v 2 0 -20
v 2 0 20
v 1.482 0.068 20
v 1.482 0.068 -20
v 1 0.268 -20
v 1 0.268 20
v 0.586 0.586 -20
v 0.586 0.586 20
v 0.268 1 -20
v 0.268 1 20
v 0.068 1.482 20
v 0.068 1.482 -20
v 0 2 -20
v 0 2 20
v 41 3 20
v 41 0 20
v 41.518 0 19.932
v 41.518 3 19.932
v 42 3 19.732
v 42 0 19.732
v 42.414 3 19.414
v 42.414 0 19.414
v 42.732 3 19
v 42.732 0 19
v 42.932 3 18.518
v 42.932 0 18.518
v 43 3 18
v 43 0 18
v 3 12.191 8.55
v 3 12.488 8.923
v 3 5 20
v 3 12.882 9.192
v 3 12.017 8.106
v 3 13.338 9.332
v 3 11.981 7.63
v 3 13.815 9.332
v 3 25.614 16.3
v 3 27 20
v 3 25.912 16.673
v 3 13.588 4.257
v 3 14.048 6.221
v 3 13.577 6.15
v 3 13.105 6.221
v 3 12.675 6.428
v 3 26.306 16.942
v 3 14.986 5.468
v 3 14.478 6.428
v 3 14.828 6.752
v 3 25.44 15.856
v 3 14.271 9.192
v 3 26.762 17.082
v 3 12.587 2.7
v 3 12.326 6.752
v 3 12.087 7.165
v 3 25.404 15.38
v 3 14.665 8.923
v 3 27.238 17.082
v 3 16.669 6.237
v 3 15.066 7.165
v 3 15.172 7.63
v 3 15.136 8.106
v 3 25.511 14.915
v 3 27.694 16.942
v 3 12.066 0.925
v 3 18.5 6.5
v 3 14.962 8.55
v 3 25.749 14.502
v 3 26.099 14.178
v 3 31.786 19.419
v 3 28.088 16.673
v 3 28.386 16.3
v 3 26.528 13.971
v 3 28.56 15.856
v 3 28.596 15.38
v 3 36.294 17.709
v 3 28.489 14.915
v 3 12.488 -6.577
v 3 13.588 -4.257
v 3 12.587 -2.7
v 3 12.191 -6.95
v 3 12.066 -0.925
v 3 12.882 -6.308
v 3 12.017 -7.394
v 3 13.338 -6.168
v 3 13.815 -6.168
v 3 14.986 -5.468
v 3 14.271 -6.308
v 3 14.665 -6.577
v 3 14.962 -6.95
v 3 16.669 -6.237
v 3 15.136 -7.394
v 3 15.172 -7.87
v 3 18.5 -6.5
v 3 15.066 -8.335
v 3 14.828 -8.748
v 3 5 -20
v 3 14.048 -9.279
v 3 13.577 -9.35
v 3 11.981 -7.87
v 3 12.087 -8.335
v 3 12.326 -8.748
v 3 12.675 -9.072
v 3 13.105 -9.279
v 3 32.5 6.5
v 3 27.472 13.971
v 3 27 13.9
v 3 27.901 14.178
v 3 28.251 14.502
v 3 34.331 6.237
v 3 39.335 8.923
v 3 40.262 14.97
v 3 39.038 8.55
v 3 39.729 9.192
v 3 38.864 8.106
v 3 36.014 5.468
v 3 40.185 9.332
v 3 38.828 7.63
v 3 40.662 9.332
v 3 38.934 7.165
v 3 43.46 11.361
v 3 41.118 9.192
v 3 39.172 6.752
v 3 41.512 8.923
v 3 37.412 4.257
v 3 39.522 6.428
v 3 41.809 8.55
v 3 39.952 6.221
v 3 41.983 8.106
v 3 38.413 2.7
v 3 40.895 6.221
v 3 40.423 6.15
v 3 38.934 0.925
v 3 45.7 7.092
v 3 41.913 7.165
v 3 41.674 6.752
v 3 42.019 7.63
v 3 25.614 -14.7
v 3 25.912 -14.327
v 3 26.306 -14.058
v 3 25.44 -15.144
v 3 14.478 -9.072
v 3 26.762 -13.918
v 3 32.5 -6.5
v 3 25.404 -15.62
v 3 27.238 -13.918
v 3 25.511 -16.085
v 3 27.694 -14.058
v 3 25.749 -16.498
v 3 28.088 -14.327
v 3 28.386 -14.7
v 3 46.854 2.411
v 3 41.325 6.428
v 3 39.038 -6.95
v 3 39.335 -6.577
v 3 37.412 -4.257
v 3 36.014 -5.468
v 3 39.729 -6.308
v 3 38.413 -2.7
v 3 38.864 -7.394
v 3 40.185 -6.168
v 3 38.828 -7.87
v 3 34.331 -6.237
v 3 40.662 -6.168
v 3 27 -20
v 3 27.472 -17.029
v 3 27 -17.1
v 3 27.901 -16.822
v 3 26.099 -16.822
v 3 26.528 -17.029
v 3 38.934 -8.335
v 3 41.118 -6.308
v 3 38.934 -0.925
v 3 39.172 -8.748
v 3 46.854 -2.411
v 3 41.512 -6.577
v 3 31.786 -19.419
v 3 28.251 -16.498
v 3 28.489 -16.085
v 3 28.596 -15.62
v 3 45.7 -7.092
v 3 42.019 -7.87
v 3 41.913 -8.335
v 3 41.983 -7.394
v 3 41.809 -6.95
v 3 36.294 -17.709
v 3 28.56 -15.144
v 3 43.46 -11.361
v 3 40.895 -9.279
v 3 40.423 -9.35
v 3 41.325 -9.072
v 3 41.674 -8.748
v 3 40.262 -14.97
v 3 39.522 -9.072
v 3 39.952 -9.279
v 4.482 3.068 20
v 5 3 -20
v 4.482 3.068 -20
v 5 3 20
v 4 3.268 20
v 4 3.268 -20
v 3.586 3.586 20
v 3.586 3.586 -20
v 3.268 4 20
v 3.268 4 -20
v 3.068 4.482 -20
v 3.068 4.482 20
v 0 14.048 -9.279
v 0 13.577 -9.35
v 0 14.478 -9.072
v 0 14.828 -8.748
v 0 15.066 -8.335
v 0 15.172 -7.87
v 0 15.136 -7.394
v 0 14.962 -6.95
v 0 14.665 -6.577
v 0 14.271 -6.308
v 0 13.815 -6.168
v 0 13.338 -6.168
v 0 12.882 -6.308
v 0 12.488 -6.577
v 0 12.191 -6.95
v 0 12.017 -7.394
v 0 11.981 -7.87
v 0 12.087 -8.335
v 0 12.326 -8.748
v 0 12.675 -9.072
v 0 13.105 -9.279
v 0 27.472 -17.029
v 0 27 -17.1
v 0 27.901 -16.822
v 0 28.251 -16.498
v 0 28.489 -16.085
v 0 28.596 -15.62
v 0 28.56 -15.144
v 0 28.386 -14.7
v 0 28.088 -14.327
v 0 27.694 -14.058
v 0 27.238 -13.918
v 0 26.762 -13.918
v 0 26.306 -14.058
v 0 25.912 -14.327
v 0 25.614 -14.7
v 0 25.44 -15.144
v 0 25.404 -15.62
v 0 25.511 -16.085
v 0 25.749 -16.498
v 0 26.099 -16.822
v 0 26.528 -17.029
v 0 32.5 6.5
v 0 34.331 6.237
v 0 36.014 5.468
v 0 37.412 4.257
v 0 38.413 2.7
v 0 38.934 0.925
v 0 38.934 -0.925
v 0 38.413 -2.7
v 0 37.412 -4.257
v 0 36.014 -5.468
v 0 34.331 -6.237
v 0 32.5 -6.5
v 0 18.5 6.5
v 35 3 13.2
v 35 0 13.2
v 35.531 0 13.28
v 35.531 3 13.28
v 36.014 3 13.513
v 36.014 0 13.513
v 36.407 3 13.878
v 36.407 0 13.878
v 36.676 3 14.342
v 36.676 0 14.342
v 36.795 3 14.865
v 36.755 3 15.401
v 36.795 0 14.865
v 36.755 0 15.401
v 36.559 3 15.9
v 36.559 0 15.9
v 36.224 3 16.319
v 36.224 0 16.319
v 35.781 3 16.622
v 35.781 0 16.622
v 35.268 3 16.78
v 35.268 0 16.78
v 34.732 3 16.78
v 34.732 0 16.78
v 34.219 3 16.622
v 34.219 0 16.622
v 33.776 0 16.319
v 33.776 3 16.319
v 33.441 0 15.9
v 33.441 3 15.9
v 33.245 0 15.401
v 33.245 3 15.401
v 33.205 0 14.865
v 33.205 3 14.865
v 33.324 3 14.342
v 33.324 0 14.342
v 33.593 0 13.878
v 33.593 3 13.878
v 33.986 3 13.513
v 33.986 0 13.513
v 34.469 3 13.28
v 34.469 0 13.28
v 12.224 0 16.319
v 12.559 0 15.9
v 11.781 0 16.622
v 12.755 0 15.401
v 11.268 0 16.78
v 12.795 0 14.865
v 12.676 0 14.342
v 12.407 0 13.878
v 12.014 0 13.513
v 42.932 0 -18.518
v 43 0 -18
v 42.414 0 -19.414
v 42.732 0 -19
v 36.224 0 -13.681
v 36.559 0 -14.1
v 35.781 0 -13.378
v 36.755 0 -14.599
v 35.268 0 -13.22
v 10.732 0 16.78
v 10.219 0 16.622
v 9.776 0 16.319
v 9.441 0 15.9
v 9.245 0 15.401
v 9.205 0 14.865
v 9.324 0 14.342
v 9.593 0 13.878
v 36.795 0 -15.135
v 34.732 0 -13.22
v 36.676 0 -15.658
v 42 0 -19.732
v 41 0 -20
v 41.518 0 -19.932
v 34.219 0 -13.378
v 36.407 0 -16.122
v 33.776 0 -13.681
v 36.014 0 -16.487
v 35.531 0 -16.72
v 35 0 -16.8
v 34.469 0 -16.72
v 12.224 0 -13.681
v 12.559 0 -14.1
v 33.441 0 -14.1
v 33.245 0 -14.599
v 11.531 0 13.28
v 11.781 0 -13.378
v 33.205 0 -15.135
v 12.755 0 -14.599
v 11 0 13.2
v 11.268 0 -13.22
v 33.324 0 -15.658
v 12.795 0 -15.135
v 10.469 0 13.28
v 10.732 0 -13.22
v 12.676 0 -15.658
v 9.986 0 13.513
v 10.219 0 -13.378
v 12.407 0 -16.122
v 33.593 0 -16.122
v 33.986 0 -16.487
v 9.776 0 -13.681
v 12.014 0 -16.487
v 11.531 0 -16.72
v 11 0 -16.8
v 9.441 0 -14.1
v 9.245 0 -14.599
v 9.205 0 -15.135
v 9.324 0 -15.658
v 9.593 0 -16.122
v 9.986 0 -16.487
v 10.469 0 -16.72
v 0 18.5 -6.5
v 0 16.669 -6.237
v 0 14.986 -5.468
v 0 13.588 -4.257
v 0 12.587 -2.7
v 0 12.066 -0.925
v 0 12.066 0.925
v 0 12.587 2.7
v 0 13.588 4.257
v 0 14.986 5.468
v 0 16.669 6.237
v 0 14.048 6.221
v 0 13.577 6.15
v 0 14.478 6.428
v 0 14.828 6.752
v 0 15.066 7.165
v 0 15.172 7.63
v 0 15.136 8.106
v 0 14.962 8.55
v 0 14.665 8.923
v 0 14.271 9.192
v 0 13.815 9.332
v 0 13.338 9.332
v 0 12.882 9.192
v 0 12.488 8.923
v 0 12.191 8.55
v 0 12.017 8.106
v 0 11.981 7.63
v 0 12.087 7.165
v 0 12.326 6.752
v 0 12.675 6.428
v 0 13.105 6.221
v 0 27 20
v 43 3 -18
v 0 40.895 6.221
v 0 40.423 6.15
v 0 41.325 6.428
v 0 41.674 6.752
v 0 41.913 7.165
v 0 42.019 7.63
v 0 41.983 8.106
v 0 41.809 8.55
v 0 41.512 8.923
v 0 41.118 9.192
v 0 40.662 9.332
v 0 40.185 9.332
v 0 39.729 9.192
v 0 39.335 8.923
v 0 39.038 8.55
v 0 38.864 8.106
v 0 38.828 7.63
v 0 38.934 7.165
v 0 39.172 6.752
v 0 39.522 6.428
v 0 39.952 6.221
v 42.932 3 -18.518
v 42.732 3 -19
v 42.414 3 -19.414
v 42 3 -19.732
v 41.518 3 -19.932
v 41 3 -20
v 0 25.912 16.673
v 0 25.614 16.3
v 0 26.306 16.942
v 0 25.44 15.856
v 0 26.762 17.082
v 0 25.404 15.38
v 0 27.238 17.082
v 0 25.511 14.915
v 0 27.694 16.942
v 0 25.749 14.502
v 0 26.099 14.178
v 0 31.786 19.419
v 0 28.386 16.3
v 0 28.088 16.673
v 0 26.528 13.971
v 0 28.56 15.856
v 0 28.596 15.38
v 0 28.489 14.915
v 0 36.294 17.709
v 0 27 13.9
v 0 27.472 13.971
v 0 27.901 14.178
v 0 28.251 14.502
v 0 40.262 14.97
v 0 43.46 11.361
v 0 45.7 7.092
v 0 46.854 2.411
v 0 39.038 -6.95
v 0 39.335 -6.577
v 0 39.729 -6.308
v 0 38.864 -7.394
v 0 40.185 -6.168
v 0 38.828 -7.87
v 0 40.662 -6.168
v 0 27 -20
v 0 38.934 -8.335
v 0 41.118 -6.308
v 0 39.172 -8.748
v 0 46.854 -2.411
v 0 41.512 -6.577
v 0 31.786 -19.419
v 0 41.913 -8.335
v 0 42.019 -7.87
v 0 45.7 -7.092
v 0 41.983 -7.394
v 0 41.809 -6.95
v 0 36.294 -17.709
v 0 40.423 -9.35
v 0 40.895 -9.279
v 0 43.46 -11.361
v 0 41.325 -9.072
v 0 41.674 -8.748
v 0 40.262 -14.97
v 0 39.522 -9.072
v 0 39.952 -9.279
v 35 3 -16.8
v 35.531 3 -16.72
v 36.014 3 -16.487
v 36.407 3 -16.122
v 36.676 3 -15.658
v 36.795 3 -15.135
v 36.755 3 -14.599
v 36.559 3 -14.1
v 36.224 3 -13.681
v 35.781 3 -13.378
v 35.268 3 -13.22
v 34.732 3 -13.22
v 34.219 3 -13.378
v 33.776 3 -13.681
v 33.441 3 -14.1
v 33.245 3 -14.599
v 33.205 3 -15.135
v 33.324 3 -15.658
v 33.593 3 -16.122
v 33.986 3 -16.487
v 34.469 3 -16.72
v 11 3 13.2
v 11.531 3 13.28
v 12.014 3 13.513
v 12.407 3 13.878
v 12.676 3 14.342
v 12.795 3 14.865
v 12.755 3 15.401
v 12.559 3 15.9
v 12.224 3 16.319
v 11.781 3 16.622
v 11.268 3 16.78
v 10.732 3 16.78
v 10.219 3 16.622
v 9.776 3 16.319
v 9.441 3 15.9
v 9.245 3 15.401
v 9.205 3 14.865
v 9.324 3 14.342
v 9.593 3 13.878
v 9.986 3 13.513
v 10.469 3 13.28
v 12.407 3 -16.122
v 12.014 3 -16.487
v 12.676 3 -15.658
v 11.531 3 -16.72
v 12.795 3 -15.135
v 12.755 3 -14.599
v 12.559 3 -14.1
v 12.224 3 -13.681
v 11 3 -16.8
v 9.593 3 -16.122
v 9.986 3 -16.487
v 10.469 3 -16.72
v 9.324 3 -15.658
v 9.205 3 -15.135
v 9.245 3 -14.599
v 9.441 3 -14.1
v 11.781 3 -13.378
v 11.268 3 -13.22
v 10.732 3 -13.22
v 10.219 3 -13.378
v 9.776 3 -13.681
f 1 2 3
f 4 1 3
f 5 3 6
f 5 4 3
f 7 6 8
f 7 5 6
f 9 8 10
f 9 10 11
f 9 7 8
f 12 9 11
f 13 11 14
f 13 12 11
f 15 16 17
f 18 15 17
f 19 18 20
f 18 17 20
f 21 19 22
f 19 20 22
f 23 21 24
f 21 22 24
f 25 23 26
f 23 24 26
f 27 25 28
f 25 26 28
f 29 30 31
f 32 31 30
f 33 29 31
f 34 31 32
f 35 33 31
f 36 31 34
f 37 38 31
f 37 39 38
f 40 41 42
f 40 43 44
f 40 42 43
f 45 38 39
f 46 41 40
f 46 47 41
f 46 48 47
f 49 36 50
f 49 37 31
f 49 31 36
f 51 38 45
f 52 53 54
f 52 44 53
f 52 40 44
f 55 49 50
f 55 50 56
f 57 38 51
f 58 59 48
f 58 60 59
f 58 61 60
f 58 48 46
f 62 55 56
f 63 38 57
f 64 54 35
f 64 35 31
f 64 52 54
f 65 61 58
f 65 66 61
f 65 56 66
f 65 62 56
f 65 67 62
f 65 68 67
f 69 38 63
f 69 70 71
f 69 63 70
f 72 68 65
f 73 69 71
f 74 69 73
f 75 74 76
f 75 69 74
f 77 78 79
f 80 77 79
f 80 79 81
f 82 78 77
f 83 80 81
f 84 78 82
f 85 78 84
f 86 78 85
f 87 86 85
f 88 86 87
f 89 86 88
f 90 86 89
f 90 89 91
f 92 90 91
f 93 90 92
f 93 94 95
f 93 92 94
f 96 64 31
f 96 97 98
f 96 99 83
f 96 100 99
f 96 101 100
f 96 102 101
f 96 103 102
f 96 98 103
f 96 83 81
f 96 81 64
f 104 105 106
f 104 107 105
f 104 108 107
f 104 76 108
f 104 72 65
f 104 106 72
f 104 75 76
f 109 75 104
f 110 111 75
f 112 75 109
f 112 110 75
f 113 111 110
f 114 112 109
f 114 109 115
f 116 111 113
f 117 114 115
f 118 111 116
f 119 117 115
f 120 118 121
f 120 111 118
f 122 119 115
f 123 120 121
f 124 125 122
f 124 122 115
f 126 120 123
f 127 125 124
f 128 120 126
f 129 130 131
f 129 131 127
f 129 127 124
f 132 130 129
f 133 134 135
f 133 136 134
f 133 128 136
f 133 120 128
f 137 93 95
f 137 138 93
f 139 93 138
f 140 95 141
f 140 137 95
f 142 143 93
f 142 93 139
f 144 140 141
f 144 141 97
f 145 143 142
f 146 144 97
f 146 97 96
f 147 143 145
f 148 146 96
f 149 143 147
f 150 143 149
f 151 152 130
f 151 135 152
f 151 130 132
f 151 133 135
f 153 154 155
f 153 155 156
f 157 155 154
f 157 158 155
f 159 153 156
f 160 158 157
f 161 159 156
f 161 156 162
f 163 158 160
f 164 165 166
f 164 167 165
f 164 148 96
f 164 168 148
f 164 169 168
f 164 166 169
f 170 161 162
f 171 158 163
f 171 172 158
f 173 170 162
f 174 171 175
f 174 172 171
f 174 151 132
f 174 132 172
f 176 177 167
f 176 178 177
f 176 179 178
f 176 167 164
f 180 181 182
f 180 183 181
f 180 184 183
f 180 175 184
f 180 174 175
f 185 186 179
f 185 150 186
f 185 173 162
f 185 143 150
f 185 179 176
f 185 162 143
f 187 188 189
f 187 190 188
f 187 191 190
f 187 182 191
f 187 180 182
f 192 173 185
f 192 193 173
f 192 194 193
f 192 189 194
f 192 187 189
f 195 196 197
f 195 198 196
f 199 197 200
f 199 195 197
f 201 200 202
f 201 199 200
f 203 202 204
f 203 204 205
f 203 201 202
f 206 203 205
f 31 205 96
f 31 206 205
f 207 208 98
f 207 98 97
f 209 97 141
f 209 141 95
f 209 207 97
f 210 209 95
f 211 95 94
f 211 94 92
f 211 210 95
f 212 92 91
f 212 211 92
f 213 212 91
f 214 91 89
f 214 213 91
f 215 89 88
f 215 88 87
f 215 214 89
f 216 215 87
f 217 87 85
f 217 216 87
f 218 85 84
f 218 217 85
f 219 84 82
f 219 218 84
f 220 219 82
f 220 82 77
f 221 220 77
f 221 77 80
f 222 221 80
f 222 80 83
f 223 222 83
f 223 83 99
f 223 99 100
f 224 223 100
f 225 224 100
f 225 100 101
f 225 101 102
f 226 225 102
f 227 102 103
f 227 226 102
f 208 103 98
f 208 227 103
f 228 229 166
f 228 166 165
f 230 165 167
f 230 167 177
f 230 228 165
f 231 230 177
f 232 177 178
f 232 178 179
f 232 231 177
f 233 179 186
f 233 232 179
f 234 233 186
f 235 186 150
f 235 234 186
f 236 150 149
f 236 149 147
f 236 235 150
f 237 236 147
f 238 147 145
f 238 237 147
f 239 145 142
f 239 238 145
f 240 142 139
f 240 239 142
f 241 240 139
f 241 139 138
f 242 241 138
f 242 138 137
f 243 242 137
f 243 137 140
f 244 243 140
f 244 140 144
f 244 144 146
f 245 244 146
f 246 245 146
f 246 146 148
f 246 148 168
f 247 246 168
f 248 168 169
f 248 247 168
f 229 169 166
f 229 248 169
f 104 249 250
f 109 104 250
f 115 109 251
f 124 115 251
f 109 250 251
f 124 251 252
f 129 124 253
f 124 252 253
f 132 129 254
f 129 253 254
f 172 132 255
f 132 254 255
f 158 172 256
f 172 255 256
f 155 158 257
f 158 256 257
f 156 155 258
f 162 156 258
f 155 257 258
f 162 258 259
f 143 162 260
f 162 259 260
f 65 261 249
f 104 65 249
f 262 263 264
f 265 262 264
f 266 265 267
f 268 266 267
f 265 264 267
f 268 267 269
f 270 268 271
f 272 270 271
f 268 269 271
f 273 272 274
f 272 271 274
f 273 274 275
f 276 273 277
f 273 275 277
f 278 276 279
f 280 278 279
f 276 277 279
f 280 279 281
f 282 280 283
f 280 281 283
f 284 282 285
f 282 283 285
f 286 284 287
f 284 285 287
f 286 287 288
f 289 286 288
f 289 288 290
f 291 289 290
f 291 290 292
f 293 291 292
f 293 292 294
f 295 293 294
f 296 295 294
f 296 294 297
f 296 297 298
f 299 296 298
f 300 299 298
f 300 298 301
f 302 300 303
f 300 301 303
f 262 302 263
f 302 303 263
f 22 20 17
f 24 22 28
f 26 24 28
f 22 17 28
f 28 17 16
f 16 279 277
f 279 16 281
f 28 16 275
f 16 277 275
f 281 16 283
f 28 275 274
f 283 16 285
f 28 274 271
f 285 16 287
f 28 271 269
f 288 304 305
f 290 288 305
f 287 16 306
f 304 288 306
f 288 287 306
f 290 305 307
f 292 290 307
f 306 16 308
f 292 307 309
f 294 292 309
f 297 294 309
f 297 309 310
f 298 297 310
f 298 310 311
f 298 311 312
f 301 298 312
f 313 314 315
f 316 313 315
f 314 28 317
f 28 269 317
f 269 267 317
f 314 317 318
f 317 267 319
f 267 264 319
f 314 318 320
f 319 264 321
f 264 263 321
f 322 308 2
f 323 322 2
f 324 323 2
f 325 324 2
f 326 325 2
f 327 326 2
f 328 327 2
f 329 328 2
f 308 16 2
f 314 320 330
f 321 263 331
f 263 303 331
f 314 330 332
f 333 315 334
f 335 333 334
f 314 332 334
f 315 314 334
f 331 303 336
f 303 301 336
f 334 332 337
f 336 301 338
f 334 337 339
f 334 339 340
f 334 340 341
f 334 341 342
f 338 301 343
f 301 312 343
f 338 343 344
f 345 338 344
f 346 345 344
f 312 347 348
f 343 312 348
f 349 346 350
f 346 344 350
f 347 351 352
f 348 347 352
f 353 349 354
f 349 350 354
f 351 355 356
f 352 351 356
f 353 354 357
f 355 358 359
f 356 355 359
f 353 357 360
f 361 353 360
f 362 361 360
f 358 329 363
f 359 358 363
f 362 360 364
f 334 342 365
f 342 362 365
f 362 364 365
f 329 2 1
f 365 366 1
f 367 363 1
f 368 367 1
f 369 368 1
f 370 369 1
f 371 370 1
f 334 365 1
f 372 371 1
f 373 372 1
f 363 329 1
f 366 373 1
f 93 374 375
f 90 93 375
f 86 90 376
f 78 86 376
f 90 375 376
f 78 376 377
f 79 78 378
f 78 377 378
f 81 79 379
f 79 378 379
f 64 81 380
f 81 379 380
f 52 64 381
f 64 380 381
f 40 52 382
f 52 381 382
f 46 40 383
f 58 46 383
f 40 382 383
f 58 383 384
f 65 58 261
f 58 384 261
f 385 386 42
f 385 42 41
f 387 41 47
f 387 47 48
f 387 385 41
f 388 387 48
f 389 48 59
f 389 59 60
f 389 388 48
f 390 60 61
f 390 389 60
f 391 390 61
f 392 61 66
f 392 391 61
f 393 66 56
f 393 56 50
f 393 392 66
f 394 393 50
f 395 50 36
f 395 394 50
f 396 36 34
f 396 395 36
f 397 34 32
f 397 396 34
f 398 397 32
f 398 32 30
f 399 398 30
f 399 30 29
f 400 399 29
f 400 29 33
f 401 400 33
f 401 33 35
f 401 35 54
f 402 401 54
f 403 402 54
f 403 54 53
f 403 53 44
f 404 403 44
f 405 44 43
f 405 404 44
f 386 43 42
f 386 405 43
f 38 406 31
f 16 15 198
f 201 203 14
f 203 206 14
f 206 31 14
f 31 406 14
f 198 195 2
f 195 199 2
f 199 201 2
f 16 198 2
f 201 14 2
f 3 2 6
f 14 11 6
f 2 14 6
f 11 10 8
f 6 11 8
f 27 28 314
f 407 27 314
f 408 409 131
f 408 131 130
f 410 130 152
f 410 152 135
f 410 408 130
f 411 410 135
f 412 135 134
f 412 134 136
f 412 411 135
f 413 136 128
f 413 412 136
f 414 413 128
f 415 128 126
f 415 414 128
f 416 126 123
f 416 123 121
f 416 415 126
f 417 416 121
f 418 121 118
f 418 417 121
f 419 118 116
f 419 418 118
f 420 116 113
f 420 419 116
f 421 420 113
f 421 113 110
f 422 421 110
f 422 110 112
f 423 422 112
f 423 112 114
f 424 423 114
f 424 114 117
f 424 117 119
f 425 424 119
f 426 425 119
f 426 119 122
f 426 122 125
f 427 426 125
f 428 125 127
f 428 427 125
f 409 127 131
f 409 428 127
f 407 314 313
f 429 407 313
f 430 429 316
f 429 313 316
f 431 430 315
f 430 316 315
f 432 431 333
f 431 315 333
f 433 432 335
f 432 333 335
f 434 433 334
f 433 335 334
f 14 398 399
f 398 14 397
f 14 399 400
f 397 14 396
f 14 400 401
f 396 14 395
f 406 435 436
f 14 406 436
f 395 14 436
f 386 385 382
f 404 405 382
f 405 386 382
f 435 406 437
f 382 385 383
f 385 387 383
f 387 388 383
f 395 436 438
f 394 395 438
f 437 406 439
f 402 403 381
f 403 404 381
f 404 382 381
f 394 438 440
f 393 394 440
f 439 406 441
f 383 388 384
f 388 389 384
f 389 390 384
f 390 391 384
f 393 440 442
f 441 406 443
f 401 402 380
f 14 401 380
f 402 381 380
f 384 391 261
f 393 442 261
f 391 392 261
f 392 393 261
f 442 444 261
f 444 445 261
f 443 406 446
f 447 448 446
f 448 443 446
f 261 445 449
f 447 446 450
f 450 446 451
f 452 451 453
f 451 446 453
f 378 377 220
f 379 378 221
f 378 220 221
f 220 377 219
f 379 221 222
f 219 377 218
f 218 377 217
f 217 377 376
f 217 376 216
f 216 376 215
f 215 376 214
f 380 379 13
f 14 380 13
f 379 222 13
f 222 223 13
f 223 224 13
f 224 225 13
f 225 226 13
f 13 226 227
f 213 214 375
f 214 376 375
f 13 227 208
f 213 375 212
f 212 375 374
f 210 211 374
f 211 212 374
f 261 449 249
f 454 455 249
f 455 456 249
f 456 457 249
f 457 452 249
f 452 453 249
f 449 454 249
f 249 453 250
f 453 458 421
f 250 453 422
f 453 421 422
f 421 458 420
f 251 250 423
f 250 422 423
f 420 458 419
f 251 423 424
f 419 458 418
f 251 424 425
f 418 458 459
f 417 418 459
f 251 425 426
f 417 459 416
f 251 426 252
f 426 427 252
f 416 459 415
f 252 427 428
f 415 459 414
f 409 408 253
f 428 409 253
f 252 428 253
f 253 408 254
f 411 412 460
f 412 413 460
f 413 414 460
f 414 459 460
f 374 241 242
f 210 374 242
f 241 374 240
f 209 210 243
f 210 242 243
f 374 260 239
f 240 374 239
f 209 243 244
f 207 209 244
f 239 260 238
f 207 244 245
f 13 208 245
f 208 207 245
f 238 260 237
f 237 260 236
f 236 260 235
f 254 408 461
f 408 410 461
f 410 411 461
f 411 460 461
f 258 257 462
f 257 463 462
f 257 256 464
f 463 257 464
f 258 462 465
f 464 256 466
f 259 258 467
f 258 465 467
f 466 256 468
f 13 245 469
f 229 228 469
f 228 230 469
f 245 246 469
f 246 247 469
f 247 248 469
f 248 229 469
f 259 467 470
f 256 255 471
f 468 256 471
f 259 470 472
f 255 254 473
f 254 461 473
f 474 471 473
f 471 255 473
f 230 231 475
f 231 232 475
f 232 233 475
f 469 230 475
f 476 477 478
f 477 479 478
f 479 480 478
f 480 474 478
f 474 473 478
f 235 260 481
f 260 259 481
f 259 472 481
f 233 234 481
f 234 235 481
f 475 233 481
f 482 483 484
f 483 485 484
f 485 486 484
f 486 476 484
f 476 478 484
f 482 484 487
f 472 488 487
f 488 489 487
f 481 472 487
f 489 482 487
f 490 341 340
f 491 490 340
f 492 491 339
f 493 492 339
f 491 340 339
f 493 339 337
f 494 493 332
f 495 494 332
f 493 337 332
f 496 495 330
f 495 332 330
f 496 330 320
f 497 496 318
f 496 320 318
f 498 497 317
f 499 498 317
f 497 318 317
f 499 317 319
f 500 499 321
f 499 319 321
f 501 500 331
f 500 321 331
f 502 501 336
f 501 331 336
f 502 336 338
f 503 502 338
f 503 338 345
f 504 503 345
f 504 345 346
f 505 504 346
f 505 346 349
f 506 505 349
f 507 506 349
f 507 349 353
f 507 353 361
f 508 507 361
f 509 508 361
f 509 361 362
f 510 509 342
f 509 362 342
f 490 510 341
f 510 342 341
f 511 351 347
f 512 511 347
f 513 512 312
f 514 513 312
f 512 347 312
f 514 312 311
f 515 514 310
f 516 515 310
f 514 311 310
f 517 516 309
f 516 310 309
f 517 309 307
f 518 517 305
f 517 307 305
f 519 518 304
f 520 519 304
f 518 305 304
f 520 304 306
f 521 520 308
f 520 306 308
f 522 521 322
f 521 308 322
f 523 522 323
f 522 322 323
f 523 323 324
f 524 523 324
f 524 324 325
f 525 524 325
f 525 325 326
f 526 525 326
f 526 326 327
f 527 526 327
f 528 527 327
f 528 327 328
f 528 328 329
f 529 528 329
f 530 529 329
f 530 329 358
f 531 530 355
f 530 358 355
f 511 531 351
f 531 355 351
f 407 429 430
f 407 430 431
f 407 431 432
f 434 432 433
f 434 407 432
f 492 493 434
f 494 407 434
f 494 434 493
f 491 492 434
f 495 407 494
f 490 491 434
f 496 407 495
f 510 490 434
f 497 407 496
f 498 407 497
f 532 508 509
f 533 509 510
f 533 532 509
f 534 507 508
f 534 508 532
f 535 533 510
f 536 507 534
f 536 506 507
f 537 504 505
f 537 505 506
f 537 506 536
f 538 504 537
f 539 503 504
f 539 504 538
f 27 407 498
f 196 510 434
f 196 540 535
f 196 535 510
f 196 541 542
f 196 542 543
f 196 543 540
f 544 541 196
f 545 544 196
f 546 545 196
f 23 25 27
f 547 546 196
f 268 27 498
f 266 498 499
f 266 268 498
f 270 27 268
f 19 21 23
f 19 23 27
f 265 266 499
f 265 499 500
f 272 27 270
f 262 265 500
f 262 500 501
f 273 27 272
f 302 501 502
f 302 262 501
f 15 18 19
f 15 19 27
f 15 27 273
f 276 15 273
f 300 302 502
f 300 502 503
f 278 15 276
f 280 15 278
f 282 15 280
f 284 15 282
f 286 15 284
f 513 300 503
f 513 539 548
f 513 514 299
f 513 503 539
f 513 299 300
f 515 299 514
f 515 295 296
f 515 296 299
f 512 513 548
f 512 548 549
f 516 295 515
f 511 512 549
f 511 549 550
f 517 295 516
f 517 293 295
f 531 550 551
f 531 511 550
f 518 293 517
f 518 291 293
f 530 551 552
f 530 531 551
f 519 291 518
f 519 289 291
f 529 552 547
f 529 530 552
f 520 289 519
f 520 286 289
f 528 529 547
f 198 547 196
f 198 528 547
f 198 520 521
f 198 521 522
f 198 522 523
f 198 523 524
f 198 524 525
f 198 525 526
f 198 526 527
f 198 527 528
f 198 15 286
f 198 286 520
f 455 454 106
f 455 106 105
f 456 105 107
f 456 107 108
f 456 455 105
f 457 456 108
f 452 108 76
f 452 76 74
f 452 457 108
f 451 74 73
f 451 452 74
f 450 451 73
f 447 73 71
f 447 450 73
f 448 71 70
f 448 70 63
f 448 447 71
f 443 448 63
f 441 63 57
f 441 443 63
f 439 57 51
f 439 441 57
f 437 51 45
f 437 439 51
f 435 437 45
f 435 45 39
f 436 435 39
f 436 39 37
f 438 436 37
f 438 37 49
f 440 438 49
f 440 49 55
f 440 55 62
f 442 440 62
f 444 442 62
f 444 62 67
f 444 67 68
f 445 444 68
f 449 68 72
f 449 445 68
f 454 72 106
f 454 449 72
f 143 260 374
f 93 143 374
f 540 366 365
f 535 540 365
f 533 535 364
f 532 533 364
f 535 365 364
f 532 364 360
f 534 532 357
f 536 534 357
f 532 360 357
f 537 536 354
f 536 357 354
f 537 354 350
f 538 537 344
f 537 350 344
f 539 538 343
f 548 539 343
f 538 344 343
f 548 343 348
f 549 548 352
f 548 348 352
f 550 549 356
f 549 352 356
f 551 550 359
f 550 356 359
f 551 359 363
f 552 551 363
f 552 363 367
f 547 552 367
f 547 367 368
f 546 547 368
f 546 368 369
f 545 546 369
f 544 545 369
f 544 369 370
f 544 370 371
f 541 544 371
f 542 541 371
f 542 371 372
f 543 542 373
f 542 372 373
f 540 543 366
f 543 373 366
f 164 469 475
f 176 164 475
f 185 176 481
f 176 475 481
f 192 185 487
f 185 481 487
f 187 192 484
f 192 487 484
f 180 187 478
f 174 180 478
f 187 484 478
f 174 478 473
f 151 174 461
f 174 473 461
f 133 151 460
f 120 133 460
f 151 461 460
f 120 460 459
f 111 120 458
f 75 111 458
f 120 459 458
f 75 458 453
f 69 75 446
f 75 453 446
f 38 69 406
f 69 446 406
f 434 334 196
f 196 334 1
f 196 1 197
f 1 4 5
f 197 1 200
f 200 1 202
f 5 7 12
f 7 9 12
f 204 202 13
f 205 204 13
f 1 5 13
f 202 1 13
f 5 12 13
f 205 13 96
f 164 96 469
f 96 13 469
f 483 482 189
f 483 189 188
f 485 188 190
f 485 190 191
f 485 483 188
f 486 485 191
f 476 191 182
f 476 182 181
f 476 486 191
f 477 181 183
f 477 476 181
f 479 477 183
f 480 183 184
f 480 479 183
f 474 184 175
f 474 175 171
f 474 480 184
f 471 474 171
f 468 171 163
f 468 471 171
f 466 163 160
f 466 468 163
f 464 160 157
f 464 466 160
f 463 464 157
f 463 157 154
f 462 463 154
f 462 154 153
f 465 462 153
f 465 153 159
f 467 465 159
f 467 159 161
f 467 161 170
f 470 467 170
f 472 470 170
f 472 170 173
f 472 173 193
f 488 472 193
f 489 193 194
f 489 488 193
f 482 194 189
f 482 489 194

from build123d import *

# Parameters (mm, degrees)
SKETCH_1_R      = 1.6
EXTRUDE_1_DEPTH = 3
SKETCH_2_R      = 1.8
EXTRUDE_2_DEPTH = 3
FILLET_1_R      = 2


with BuildPart() as part:
    # 草图1 → 凸台-拉伸1 (new body)
    with BuildSketch(Plane(origin=(0, 0, 0), x_dir=(0, 0, -1), z_dir=(1, 0, 0))):
        with BuildLine():
            Line((-20, 0), (20, 0))
            Line((20, 0), (20, 27))
            ThreePointArc((20, 27), (0, 47), (-20, 27))
            Line((-20, 27), (-20, 0))
        make_face()
        with Locations((-7.75, 40.423393759)):
            Circle(SKETCH_1_R, mode=Mode.SUBTRACT)
        with Locations((7.75, 40.423393759)):
            Circle(SKETCH_1_R, mode=Mode.SUBTRACT)
        with Locations((15.5, 27)):
            Circle(SKETCH_1_R, mode=Mode.SUBTRACT)
        with Locations((7.75, 13.576606241)):
            Circle(SKETCH_1_R, mode=Mode.SUBTRACT)
        with Locations((-7.75, 13.576606241)):
            Circle(SKETCH_1_R, mode=Mode.SUBTRACT)
        with Locations((-15.5, 27)):
            Circle(SKETCH_1_R, mode=Mode.SUBTRACT)
        with BuildLine():
            Line((6.5, 32.5), (6.5, 18.5))
            ThreePointArc((6.5, 18.5), (0, 12), (-6.5, 18.5))
            Line((-6.5, 18.5), (-6.5, 32.5))
            ThreePointArc((-6.5, 32.5), (0, 39), (6.5, 32.5))
        make_face(mode=Mode.SUBTRACT)
    extrude(amount=EXTRUDE_1_DEPTH)

    # 草图2 → 凸台-拉伸2 (add)
    with BuildSketch(Plane.XZ):
        with BuildLine():
            Line((0, 20), (41, 20))
            ThreePointArc((41, 20), (42.414213562, 19.414213562), (43, 18))
            Line((43, 18), (43, -18))
            ThreePointArc((43, -18), (42.414213562, -19.414213562), (41, -20))
            Line((41, -20), (0, -20))
            Line((0, -20), (0, 20))
        make_face()
        with Locations(Location((11, 15, 0), (0, 0, 270))):
            Circle(SKETCH_2_R, mode=Mode.SUBTRACT)
        with Locations(Location((35, 15, 0), (0, 0, 270))):
            Circle(SKETCH_2_R, mode=Mode.SUBTRACT)
        with Locations(Location((11, -15, 0), (0, 0, 270))):
            Circle(SKETCH_2_R, mode=Mode.SUBTRACT)
        with Locations(Location((35, -15, 0), (0, 0, 270))):
            Circle(SKETCH_2_R, mode=Mode.SUBTRACT)
    extrude(amount=-EXTRUDE_2_DEPTH)

    # 圆角1
    fillet_1_edges = [part.edges().sort_by_distance(p)[0] for p in [
        (0, 0, 0),
        (3, 3, 0),
    ]]
    fillet(fillet_1_edges, radius=FILLET_1_R)


solid = part.part
